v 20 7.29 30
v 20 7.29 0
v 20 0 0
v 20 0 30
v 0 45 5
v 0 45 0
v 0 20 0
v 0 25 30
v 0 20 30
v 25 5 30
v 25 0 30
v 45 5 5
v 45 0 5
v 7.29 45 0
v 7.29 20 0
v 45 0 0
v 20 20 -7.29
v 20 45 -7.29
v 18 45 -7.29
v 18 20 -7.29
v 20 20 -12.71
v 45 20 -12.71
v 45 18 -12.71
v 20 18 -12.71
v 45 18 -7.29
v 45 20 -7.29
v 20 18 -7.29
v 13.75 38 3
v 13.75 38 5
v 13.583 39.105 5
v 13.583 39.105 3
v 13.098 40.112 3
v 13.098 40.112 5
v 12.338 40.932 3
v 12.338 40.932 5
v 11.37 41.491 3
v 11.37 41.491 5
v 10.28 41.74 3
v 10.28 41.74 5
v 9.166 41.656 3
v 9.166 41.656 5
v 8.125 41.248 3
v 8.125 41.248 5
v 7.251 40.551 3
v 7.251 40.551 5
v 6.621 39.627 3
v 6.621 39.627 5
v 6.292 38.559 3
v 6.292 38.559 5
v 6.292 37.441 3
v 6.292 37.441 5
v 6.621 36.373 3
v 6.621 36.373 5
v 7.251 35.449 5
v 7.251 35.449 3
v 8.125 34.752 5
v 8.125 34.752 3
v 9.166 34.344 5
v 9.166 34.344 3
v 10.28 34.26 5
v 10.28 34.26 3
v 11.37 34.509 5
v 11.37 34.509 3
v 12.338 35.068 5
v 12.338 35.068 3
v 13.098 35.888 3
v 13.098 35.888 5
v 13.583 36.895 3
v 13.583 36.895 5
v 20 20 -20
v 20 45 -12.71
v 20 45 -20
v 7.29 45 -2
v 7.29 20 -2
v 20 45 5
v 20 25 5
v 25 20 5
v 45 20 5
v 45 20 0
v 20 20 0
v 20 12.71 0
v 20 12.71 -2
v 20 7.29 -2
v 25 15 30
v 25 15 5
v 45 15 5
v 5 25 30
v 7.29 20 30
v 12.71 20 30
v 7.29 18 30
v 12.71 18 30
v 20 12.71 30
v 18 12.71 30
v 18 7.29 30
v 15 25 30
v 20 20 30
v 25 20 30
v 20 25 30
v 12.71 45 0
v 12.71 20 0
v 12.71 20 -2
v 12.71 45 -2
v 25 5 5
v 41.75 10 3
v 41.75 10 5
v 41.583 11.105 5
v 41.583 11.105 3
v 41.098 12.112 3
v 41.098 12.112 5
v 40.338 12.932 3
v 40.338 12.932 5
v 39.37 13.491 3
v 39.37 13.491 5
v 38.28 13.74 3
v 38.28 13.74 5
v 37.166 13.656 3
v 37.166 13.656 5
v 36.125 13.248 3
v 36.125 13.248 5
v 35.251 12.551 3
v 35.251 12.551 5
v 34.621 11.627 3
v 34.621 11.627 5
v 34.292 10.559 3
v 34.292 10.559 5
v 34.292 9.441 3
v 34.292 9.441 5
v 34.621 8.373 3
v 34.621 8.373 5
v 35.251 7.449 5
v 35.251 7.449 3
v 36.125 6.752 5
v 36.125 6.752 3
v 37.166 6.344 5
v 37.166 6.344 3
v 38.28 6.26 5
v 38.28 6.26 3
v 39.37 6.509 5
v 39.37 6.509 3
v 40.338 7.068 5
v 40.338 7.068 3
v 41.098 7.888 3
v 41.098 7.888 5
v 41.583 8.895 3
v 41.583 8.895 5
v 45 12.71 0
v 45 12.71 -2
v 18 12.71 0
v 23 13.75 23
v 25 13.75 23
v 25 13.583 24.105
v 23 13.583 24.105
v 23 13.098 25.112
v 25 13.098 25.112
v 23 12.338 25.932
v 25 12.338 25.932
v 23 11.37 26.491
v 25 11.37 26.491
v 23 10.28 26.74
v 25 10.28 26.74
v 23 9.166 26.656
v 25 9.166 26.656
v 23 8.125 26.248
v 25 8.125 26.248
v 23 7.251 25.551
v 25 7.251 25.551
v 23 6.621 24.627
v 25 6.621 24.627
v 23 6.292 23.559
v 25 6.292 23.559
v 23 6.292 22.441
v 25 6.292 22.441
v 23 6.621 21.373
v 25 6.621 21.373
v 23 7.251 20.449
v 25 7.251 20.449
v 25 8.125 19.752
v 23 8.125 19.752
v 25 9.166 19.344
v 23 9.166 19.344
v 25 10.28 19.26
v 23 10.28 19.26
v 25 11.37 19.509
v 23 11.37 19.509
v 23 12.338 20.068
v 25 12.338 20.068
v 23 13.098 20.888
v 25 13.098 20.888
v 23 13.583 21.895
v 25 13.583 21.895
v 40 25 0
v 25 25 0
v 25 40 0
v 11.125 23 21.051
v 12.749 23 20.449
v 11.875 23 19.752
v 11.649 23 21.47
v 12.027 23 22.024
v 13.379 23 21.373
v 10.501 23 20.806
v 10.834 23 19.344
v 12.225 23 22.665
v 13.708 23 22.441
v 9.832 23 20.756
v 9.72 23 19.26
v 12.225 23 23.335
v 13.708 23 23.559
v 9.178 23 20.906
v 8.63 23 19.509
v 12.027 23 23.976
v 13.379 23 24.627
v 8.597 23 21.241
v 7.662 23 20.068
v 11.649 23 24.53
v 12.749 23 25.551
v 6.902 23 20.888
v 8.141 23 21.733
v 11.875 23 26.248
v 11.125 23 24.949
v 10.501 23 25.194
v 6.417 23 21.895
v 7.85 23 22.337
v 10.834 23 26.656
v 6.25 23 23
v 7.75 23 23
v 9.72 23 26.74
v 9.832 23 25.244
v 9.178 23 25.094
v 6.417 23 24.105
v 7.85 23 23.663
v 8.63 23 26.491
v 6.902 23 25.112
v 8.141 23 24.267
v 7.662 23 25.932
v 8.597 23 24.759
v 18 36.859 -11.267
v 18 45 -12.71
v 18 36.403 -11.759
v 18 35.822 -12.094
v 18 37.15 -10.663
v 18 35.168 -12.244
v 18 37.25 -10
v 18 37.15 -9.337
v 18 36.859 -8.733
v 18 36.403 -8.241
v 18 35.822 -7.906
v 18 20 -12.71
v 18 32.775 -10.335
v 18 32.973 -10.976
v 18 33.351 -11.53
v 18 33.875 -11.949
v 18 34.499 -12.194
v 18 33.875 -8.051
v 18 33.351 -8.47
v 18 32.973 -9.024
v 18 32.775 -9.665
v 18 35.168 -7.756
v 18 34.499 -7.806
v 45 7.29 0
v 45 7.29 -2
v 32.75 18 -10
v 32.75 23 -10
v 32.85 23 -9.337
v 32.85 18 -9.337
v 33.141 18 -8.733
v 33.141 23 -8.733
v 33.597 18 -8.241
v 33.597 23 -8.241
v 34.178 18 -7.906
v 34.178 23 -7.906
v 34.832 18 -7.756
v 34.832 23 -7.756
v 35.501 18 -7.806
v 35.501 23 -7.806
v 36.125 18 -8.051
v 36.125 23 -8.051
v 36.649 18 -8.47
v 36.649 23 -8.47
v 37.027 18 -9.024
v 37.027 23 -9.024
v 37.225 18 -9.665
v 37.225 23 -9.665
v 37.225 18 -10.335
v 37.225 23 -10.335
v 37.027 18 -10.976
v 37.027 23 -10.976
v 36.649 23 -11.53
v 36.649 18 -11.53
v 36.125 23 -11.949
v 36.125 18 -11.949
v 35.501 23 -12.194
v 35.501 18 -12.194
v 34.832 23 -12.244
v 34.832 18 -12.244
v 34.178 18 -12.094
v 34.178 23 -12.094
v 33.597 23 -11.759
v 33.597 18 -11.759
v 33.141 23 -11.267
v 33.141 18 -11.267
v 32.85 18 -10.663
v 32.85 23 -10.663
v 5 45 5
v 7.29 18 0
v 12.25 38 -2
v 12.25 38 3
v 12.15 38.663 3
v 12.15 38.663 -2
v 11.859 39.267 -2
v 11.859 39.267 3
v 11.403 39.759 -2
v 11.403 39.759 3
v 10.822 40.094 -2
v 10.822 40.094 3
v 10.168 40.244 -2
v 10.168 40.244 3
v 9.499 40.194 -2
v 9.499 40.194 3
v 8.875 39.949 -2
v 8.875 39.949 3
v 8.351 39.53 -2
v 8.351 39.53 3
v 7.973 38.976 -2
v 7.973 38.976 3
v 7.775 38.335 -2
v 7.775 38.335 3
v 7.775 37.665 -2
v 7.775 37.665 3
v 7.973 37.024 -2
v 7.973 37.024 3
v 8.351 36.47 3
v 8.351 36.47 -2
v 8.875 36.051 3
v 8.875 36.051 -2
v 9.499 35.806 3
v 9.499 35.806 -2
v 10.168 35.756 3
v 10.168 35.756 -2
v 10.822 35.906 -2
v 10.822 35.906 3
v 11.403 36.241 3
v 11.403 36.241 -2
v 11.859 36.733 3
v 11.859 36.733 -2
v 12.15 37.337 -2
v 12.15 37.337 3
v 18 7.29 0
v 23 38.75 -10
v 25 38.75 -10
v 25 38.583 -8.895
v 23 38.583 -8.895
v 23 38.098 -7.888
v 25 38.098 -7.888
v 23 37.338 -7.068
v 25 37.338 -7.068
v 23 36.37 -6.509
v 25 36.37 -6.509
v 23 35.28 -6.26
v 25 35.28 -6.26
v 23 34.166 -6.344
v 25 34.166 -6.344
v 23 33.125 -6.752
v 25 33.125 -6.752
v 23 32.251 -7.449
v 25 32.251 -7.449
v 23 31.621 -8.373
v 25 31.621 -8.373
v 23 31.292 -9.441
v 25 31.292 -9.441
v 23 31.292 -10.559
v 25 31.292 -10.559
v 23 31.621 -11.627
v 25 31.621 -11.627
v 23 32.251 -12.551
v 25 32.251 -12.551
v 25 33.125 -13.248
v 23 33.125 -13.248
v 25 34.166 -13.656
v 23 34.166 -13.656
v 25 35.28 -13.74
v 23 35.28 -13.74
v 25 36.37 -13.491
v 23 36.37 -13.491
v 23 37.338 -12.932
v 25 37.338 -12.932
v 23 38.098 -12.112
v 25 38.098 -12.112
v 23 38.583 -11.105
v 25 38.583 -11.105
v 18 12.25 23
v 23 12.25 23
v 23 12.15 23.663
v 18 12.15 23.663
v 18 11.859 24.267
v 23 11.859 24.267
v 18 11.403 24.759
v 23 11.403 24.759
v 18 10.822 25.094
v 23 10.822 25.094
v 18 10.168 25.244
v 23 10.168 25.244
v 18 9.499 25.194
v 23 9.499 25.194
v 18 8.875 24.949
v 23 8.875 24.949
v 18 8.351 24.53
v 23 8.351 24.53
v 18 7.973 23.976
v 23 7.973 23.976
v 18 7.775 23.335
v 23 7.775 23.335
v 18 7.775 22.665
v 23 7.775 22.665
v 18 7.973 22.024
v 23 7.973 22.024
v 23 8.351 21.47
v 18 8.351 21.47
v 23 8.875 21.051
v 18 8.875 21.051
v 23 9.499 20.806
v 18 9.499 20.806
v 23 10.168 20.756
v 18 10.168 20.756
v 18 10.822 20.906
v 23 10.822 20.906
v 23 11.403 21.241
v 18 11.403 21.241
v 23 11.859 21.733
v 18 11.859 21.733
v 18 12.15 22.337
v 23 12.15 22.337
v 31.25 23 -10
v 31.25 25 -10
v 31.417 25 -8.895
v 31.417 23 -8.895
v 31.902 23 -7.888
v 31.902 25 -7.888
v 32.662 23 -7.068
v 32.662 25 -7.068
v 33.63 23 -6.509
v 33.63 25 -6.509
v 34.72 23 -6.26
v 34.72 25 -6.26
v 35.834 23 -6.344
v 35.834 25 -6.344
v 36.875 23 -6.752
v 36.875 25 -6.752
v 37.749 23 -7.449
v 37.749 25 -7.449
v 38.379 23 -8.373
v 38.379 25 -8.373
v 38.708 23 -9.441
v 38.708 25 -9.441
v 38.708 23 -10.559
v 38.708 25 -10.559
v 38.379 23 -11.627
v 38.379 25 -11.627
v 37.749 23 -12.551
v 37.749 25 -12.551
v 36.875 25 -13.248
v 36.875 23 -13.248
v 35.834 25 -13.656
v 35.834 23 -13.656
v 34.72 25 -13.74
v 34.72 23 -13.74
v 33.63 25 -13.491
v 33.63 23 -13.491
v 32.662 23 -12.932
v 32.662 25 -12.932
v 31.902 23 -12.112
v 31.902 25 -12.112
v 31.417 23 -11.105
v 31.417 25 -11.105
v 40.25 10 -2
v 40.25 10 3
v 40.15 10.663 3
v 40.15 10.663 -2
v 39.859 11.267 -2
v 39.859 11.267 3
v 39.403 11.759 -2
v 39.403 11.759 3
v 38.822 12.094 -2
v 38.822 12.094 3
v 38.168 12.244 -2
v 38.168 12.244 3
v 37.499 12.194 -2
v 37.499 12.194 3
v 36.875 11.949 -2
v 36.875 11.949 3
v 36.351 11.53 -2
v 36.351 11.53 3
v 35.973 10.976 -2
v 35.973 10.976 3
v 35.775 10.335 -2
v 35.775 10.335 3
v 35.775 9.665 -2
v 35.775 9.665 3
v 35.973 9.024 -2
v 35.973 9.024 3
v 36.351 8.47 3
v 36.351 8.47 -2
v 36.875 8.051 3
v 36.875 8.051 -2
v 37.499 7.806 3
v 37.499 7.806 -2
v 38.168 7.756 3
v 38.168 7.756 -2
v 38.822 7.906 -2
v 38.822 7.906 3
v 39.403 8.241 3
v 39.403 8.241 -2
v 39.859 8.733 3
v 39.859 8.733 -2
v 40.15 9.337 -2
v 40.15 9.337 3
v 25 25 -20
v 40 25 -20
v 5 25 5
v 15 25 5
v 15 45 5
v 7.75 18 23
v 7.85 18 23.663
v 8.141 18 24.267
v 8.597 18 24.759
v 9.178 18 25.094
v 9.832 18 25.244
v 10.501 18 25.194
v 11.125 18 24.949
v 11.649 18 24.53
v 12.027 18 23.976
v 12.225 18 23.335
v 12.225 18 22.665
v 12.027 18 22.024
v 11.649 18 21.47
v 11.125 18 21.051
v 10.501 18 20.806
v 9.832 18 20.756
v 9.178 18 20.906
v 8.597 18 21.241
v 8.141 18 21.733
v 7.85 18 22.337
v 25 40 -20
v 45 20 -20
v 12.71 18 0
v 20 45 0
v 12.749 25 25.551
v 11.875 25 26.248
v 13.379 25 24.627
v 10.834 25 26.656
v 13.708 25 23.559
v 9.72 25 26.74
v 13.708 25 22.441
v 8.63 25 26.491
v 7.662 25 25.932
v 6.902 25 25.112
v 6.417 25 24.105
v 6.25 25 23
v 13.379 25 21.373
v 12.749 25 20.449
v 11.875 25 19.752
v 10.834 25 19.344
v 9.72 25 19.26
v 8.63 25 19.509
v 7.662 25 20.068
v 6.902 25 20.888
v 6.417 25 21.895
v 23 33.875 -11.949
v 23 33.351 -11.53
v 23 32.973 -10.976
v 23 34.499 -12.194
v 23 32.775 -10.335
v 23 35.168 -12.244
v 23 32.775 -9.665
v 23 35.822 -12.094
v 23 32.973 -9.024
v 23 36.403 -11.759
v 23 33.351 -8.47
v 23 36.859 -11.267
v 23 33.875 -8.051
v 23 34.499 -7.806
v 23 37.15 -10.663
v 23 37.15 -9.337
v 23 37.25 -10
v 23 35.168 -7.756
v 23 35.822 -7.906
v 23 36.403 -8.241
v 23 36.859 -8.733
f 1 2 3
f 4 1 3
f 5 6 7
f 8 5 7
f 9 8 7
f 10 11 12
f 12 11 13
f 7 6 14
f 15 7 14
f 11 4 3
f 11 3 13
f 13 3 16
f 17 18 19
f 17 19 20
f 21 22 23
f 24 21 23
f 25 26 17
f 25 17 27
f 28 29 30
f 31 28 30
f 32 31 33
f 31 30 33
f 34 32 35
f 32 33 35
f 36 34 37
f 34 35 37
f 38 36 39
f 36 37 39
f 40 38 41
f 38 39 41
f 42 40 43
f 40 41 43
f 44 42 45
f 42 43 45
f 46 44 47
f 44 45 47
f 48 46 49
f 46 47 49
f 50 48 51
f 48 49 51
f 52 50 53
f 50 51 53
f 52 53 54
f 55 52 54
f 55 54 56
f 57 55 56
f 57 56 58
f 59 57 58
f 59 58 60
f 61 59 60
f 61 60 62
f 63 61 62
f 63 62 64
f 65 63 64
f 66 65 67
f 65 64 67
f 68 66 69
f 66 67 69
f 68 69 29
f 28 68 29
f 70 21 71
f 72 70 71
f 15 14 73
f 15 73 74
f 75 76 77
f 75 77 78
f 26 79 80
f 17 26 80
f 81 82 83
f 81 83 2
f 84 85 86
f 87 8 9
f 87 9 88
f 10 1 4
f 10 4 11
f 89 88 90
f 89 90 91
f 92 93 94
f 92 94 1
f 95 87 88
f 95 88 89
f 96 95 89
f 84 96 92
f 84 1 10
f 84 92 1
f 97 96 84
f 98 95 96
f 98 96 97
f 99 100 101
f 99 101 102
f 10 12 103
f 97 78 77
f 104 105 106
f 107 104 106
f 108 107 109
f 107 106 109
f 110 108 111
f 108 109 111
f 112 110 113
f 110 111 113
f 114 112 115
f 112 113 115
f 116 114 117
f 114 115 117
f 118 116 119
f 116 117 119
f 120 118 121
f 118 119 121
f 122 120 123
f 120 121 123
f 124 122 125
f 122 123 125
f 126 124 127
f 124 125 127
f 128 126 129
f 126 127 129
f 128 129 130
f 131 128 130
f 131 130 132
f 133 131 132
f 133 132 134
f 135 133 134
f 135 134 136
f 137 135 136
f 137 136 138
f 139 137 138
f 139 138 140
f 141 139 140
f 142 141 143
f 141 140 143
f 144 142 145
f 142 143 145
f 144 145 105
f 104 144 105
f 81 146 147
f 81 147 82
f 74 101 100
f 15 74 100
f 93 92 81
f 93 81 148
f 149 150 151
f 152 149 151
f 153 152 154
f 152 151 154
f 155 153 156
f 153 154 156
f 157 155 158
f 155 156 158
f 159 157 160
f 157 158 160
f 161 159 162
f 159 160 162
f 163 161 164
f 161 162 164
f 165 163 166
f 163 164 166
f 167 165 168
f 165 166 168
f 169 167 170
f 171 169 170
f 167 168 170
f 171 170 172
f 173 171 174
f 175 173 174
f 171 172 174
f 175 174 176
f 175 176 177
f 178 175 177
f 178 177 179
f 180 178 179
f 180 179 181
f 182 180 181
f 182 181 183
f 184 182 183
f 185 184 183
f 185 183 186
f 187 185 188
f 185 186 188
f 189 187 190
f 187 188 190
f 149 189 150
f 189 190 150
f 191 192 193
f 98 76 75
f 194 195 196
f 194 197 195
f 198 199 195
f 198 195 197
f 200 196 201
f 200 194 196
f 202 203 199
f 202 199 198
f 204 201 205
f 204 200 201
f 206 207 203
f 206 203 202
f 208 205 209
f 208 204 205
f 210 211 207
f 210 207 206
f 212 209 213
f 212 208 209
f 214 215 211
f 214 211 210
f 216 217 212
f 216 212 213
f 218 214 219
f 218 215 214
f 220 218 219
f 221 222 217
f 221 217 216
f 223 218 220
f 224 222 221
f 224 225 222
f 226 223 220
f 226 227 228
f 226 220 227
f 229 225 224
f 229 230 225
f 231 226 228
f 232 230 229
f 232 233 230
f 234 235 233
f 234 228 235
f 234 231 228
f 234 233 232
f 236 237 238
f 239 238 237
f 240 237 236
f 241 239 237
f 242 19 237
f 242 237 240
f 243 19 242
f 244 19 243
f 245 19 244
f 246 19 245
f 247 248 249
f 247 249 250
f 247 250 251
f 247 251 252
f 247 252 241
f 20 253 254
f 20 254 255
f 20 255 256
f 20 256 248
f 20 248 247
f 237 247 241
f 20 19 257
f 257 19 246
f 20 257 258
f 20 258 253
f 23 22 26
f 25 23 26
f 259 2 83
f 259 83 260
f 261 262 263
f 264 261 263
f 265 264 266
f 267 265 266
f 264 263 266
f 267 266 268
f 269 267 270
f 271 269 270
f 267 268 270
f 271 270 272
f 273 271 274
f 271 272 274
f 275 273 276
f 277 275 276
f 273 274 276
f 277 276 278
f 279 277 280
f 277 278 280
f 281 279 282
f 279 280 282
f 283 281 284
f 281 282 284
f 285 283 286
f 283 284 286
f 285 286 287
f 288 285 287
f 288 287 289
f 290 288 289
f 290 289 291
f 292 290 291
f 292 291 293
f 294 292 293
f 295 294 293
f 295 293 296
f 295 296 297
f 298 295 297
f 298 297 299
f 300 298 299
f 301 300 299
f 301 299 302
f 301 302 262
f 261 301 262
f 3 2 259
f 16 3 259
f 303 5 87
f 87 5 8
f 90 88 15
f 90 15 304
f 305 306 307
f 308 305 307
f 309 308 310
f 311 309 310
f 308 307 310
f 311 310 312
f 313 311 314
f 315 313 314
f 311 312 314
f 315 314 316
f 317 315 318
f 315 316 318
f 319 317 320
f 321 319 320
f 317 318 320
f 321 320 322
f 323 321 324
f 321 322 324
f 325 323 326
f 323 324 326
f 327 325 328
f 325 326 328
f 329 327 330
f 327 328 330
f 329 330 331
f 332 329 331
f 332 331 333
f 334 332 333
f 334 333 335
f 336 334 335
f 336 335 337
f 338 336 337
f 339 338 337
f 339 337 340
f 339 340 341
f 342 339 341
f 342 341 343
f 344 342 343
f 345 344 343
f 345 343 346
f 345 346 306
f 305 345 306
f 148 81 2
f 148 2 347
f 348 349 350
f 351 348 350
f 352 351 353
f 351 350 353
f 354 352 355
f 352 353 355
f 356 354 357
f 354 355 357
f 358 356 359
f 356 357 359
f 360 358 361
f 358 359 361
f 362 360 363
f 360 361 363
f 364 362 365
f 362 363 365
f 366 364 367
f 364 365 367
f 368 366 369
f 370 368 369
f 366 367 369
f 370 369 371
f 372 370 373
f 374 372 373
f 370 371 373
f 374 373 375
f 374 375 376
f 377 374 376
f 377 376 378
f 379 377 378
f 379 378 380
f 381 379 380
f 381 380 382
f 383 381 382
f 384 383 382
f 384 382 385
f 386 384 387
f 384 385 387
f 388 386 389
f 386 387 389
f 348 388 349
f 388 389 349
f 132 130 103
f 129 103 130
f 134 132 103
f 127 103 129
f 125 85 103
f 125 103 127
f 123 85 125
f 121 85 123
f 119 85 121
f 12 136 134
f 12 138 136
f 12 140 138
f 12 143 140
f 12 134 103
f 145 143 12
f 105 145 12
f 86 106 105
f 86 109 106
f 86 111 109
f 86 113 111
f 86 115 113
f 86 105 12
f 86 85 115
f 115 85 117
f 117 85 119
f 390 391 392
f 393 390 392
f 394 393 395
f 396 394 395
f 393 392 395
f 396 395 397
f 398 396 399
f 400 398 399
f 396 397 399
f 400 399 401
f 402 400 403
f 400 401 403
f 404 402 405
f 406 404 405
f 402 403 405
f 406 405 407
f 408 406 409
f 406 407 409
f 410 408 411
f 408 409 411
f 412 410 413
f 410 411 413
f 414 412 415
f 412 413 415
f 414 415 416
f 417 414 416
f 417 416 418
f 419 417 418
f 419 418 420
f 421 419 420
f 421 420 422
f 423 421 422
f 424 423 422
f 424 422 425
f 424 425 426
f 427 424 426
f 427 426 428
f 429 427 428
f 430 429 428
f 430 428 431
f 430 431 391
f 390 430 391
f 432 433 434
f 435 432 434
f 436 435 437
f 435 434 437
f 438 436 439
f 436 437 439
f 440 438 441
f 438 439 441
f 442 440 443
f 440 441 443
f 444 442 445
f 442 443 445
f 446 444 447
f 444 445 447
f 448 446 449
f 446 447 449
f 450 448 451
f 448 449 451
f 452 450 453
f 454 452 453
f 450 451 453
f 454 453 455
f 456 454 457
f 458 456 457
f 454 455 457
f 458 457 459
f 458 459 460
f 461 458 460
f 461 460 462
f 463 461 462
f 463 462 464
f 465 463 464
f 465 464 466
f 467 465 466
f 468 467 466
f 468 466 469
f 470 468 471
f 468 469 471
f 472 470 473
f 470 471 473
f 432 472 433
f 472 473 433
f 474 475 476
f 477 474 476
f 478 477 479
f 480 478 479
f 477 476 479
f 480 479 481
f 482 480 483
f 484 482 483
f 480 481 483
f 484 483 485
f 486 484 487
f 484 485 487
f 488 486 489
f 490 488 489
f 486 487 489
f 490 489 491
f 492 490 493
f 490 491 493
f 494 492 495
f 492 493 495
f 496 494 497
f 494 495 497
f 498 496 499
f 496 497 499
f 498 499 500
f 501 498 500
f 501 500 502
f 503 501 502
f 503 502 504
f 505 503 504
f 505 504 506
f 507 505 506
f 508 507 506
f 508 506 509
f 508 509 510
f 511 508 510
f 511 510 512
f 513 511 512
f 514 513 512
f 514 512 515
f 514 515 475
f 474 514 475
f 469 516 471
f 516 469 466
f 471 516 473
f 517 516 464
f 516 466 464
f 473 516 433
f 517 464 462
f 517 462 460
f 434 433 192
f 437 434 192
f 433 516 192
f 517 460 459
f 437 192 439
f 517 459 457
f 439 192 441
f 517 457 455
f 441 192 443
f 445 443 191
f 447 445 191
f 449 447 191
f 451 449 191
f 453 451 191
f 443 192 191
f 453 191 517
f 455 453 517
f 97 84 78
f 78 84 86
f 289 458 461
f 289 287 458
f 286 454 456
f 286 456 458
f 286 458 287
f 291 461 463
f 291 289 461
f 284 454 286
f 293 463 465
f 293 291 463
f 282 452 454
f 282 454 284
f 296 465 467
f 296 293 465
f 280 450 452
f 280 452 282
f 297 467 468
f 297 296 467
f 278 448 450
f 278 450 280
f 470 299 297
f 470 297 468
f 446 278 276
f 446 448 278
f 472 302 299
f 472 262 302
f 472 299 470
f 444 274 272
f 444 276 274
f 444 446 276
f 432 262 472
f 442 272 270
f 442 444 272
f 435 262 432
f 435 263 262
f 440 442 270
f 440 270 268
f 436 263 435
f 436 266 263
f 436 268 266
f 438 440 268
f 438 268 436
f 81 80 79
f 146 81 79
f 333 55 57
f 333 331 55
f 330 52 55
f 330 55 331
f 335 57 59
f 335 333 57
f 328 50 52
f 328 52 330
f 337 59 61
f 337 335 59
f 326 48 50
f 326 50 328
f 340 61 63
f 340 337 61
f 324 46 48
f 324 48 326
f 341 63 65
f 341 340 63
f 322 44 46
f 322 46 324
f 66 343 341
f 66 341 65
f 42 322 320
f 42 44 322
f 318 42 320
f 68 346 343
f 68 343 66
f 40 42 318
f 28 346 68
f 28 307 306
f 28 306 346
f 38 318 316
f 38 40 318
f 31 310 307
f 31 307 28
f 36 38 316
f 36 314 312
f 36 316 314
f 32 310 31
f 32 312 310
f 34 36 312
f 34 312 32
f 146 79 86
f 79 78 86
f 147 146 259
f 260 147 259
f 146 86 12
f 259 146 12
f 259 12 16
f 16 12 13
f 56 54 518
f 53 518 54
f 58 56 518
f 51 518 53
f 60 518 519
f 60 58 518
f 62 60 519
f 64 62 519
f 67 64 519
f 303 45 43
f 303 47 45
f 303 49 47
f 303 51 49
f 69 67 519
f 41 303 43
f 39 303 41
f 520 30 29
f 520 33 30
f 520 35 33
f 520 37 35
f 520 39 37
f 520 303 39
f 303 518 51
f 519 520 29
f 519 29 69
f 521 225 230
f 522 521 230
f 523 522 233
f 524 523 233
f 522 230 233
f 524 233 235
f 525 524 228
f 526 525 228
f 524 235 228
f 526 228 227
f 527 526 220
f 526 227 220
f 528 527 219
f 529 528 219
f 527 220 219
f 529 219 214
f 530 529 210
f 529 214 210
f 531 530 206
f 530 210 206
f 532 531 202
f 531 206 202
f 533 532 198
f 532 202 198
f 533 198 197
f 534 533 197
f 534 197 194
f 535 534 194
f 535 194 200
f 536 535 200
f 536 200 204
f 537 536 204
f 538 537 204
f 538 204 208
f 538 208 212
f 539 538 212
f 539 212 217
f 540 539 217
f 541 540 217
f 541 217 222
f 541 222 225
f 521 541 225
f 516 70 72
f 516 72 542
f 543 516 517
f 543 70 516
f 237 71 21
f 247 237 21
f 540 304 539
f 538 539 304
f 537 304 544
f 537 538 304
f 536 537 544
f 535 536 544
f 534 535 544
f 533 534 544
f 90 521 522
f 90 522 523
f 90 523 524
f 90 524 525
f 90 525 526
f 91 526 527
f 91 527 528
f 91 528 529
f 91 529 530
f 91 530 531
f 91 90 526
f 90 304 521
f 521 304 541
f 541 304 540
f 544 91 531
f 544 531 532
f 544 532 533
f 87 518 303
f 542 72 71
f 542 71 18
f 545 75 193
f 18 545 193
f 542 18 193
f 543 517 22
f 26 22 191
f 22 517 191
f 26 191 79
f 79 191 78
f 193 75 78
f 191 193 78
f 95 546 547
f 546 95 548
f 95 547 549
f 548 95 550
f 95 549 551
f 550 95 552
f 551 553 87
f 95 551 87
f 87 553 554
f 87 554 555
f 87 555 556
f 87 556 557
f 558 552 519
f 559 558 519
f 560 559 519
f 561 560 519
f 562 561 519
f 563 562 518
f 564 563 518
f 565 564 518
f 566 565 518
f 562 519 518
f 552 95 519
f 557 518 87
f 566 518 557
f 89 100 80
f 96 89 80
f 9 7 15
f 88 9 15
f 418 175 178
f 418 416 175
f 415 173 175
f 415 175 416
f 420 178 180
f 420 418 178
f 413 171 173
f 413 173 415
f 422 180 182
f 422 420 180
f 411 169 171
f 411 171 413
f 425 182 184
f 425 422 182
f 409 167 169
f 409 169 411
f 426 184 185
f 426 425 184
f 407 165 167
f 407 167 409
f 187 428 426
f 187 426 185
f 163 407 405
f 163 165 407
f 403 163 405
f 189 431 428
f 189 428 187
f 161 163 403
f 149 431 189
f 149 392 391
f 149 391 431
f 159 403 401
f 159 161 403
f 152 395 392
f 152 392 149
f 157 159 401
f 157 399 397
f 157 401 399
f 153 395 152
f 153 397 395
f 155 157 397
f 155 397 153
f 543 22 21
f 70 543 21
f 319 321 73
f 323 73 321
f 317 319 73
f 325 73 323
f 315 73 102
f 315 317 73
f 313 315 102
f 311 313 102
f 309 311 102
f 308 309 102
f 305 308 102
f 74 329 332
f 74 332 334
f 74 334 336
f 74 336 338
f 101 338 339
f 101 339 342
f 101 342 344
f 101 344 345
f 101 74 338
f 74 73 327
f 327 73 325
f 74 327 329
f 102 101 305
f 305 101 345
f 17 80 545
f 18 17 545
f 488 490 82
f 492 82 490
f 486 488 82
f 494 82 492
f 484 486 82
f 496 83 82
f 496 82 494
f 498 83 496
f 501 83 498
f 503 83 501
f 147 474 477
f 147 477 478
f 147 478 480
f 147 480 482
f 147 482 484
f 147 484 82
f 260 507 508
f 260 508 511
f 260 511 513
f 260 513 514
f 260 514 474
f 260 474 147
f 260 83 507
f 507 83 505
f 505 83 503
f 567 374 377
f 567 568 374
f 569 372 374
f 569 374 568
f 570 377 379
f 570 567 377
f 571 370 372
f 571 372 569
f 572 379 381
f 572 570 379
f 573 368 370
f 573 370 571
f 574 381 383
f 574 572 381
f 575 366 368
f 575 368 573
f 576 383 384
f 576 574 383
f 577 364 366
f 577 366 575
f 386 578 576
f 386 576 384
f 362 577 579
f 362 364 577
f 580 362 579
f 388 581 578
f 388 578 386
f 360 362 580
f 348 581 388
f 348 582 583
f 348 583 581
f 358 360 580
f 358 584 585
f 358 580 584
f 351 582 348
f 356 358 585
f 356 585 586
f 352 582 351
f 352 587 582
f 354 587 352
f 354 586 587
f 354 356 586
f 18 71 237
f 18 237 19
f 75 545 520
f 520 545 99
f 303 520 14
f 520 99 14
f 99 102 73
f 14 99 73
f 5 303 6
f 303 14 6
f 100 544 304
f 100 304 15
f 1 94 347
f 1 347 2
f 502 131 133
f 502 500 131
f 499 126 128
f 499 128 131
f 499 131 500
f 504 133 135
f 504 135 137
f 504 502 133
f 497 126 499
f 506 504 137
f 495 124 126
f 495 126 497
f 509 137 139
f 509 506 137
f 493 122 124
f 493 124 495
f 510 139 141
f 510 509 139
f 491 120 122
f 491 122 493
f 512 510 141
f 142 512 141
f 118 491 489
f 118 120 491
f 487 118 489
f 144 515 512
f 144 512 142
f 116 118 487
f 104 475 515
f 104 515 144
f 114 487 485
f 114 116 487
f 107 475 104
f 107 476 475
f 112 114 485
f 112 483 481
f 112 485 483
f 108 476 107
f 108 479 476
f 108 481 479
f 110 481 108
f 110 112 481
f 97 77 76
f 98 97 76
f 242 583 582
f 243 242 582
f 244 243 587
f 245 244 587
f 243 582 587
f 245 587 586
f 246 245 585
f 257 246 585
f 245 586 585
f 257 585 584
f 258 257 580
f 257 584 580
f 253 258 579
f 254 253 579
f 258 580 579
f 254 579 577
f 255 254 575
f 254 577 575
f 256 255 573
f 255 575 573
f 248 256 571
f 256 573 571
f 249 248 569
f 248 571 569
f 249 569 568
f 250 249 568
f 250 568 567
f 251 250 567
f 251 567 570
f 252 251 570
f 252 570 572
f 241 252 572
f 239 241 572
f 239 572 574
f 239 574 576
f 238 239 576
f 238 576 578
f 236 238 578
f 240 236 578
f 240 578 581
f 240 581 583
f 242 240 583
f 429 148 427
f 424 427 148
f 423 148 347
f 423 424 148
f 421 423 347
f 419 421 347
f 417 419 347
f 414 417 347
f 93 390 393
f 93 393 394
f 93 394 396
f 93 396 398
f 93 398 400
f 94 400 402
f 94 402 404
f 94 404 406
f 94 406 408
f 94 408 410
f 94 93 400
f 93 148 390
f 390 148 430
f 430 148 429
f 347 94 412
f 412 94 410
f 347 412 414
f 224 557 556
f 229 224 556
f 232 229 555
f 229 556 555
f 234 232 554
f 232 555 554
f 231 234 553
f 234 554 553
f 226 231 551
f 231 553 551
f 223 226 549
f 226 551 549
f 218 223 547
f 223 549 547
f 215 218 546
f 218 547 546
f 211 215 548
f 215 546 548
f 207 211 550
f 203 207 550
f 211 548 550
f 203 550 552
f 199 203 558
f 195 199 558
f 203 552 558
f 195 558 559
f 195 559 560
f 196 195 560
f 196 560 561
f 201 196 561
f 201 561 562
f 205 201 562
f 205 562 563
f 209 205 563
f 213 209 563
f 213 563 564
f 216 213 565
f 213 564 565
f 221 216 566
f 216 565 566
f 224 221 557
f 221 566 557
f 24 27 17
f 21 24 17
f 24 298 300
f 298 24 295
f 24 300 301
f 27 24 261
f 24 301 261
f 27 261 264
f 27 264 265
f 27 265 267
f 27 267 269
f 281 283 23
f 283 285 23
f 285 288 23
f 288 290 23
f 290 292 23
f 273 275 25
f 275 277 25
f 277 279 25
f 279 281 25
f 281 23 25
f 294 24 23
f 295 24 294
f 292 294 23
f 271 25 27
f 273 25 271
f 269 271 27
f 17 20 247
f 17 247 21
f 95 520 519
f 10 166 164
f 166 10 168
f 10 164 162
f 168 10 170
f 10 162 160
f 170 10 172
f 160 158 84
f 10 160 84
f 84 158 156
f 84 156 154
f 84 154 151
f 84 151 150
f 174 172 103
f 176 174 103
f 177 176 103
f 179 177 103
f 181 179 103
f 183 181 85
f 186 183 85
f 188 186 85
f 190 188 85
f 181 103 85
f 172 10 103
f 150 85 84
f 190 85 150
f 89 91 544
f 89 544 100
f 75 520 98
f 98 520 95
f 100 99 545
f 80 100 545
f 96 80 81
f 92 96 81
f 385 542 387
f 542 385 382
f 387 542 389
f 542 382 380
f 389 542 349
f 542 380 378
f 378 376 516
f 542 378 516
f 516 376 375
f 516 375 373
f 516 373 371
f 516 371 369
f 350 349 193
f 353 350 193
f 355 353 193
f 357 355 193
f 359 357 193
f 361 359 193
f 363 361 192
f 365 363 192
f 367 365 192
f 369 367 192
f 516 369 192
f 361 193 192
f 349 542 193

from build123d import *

# Parameters (mm, degrees)
F1_DEPTH  = 5
F3_DEPTH  = 25
F4_DEPTH  = 25
F6_DEPTH  = 45.001
F7_W      = 27
F7_H      = 5.42
F7_W_2    = 5.42
F7_H_2    = 27
F8_DEPTH  = 2
F10_DEPTH = 45.001
F12_DEPTH = 30
F13_R     = 2.25
F14_DEPTH = 7.001
F15_R     = 2.25
F16_DEPTH = 25.001
F17_R     = 2.25
F18_DEPTH = 25.001
F20_DEPTH = 20
F22_DEPTH = 2
F23_W     = 27
F23_H     = 5.42
F24_DEPTH = 2
F25_R     = 2.25
F26_DEPTH = 25.001
F27_R     = 2.25
F28_DEPTH = 25.001
F29_R     = 3.75
F30_DEPTH = 2
F31_R     = 3.75
F32_DEPTH = 2
F33_R     = 3.75
F34_DEPTH = 2
F35_R     = 3.75
F36_DEPTH = 2
F37_R     = 3.75
F38_DEPTH = 2
F39_R     = 3.75
F40_DEPTH = 2
F41_W     = 2
F41_H     = 2
F42_DEPTH = 12.711
F43_W     = 2
F43_H     = 2
F44_DEPTH = 12.711
F45_W     = 2
F45_H     = 2
F46_DEPTH = 12.711


with BuildPart() as f1:
    # F0 (on Top) → F1 (new body)
    with BuildSketch(Plane.XY):
        Polygon((0, 20), (20, 20), (20, 0), (45, 0), (45, 20), (20, 45), (0, 45), align=None)
    extrude(amount=F1_DEPTH)

    # F2 (on face) → F3 (join)
    with BuildSketch(Plane.XY.offset(5)):
        Polygon((0, 25), (0, 20), (20, 20), (20, 0), (25, 0), (45, 0), (45, 5), (25, 5), (25, 15), (45, 15), (45, 20), (25, 20), (20, 25), (20, 45), (15, 45), (15, 25), (5, 25), (5, 45), (0, 45), align=None)
    extrude(amount=F3_DEPTH)

    # F2 (on face) → F4 (join)
    with BuildSketch(Plane.XY.offset(5)):
        Polygon((0, 25), (0, 20), (20, 20), (20, 0), (25, 0), (45, 0), (45, 5), (25, 5), (25, 15), (45, 15), (45, 20), (25, 20), (20, 25), (20, 45), (15, 45), (15, 25), (5, 25), (5, 45), (0, 45), align=None)
    extrude(amount=F4_DEPTH)

    # F5 (on face) → F6 (cut, through all)
    with BuildSketch(Plane(origin=(0, 0, 0), x_dir=(0, -1, 0), z_dir=(-1, 0, 0))):
        Polygon((-45, 30), (-45, 5), (-25, 30), align=None)
    extrude(amount=-F6_DEPTH, mode=Mode.SUBTRACT)

    # F7 (on face) → F8 (join)
    with BuildSketch(Plane(origin=(0, 0, 0), x_dir=(1, 0, 0), z_dir=(0, 0, -1))):
        with Locations((31.5, -10)):
            Rectangle(F7_W, F7_H)
        with Locations((10, -31.5)):
            Rectangle(F7_W_2, F7_H_2)
    extrude(amount=F8_DEPTH)

    # F9 (on face) → F10 (cut, through all)
    with BuildSketch(Plane.XZ):
        Polygon((45, 30), (25, 30), (45, 5), align=None)
    extrude(amount=-F10_DEPTH, mode=Mode.SUBTRACT)

    # F11 (on face) → F12 (join)
    with BuildSketch(Plane.XY.offset(30)):
        Polygon((12.71, 20), (10, 20), (7.29, 20), (7.29, 18), (12.71, 18), align=None)
        Polygon((20, 7.29), (20, 10), (20, 12.71), (18, 12.71), (18, 7.29), align=None)
    extrude(amount=-F12_DEPTH)

    # F13 (on face) → F14 (cut, through all)
    with BuildSketch(Plane.XY.offset(5)):
        with Locations((10, 38)):
            Circle(F13_R)
        with Locations((38, 10)):
            Circle(F13_R)
    extrude(amount=-F14_DEPTH, mode=Mode.SUBTRACT)

    # F15 (on face) → F16 (cut, through all)
    with BuildSketch(Plane(origin=(0, 25, 0), x_dir=(-1, 0, 0), z_dir=(0, 1, 0))):
        with Locations((-10, 23)):
            Circle(F15_R)
    extrude(amount=-F16_DEPTH, mode=Mode.SUBTRACT)

    # F17 (on face) → F18 (cut, through all)
    with BuildSketch(Plane.YZ.offset(25)):
        with Locations((10, 23)):
            Circle(F17_R)
    extrude(amount=-F18_DEPTH, mode=Mode.SUBTRACT)

    # F19 (on face) → F20 (join)
    with BuildSketch(Plane(origin=(0, 0, 0), x_dir=(1, 0, 0), z_dir=(0, 0, -1))):
        Polygon((40, -25), (45, -20), (20, -20), (20, -45), (25, -40), (25, -25), align=None)
    extrude(amount=F20_DEPTH)

    # F21 (on face) → F22 (join)
    with BuildSketch(Plane.XZ.offset(-20)):
        Polygon((45, -12.71), (45, -10), (45, -7.29), (20, -7.29), (20, -12.71), align=None)
    extrude(amount=F22_DEPTH)

    # F23 (on face) → F24 (join)
    with BuildSketch(Plane(origin=(20, 0, 0), x_dir=(0, -1, 0), z_dir=(-1, 0, 0))):
        with Locations((-31.5, -10)):
            Rectangle(F23_W, F23_H)
    extrude(amount=F24_DEPTH)

    # F25 (on face) → F26 (cut, through all)
    with BuildSketch(Plane.YZ.offset(25)):
        with Locations((35, -10)):
            Circle(F25_R)
    extrude(amount=-F26_DEPTH, mode=Mode.SUBTRACT)

    # F27 (on face) → F28 (cut, through all)
    with BuildSketch(Plane(origin=(0, 25, 0), x_dir=(-1, 0, 0), z_dir=(0, 1, 0))):
        with Locations((-35, -10)):
            Circle(F27_R)
    extrude(amount=-F28_DEPTH, mode=Mode.SUBTRACT)

    # F29 (on face) → F30 (cut)
    with BuildSketch(Plane(origin=(0, 25, 0), x_dir=(-1, 0, 0), z_dir=(0, 1, 0))):
        with Locations((-35, -10)):
            Circle(F29_R)
    extrude(amount=-F30_DEPTH, mode=Mode.SUBTRACT)

    # F31 (on face) → F32 (cut)
    with BuildSketch(Plane.YZ.offset(25)):
        with Locations((35, -10)):
            Circle(F31_R)
    extrude(amount=-F32_DEPTH, mode=Mode.SUBTRACT)

    # F33 (on face) → F34 (cut)
    with BuildSketch(Plane(origin=(0, 25, 0), x_dir=(-1, 0, 0), z_dir=(0, 1, 0))):
        with Locations((-10, 23)):
            Circle(F33_R)
    extrude(amount=-F34_DEPTH, mode=Mode.SUBTRACT)

    # F35 (on face) → F36 (cut)
    with BuildSketch(Plane.YZ.offset(25)):
        with Locations((10, 23)):
            Circle(F35_R)
    extrude(amount=-F36_DEPTH, mode=Mode.SUBTRACT)

    # F37 (on face) → F38 (cut)
    with BuildSketch(Plane.XY.offset(5)):
        with Locations((38, 10)):
            Circle(F37_R)
    extrude(amount=-F38_DEPTH, mode=Mode.SUBTRACT)

    # F39 (on face) → F40 (cut)
    with BuildSketch(Plane.XY.offset(5)):
        with Locations((10, 38)):
            Circle(F39_R)
    extrude(amount=-F40_DEPTH, mode=Mode.SUBTRACT)

    # F41 (on face) → F42 (cut, through all)
    with BuildSketch(Plane.XY.offset(-7.29)):
        with Locations((19, 19)):
            Rectangle(F41_W, F41_H)
    extrude(amount=-F42_DEPTH, mode=Mode.SUBTRACT)

    # F43 (on face) → F44 (cut, through all)
    with BuildSketch(Plane.YZ.offset(12.71)):
        with Locations((19, -1)):
            Rectangle(F43_W, F43_H)
    extrude(amount=-F44_DEPTH, mode=Mode.SUBTRACT)

    # F45 (on face) → F46 (cut, through all)
    with BuildSketch(Plane(origin=(0, 12.71, 0), x_dir=(-1, 0, 0), z_dir=(0, 1, 0))):
        with Locations((-19, -1)):
            Rectangle(F45_W, F45_H)
    extrude(amount=-F46_DEPTH, mode=Mode.SUBTRACT)


solid = f1.part
